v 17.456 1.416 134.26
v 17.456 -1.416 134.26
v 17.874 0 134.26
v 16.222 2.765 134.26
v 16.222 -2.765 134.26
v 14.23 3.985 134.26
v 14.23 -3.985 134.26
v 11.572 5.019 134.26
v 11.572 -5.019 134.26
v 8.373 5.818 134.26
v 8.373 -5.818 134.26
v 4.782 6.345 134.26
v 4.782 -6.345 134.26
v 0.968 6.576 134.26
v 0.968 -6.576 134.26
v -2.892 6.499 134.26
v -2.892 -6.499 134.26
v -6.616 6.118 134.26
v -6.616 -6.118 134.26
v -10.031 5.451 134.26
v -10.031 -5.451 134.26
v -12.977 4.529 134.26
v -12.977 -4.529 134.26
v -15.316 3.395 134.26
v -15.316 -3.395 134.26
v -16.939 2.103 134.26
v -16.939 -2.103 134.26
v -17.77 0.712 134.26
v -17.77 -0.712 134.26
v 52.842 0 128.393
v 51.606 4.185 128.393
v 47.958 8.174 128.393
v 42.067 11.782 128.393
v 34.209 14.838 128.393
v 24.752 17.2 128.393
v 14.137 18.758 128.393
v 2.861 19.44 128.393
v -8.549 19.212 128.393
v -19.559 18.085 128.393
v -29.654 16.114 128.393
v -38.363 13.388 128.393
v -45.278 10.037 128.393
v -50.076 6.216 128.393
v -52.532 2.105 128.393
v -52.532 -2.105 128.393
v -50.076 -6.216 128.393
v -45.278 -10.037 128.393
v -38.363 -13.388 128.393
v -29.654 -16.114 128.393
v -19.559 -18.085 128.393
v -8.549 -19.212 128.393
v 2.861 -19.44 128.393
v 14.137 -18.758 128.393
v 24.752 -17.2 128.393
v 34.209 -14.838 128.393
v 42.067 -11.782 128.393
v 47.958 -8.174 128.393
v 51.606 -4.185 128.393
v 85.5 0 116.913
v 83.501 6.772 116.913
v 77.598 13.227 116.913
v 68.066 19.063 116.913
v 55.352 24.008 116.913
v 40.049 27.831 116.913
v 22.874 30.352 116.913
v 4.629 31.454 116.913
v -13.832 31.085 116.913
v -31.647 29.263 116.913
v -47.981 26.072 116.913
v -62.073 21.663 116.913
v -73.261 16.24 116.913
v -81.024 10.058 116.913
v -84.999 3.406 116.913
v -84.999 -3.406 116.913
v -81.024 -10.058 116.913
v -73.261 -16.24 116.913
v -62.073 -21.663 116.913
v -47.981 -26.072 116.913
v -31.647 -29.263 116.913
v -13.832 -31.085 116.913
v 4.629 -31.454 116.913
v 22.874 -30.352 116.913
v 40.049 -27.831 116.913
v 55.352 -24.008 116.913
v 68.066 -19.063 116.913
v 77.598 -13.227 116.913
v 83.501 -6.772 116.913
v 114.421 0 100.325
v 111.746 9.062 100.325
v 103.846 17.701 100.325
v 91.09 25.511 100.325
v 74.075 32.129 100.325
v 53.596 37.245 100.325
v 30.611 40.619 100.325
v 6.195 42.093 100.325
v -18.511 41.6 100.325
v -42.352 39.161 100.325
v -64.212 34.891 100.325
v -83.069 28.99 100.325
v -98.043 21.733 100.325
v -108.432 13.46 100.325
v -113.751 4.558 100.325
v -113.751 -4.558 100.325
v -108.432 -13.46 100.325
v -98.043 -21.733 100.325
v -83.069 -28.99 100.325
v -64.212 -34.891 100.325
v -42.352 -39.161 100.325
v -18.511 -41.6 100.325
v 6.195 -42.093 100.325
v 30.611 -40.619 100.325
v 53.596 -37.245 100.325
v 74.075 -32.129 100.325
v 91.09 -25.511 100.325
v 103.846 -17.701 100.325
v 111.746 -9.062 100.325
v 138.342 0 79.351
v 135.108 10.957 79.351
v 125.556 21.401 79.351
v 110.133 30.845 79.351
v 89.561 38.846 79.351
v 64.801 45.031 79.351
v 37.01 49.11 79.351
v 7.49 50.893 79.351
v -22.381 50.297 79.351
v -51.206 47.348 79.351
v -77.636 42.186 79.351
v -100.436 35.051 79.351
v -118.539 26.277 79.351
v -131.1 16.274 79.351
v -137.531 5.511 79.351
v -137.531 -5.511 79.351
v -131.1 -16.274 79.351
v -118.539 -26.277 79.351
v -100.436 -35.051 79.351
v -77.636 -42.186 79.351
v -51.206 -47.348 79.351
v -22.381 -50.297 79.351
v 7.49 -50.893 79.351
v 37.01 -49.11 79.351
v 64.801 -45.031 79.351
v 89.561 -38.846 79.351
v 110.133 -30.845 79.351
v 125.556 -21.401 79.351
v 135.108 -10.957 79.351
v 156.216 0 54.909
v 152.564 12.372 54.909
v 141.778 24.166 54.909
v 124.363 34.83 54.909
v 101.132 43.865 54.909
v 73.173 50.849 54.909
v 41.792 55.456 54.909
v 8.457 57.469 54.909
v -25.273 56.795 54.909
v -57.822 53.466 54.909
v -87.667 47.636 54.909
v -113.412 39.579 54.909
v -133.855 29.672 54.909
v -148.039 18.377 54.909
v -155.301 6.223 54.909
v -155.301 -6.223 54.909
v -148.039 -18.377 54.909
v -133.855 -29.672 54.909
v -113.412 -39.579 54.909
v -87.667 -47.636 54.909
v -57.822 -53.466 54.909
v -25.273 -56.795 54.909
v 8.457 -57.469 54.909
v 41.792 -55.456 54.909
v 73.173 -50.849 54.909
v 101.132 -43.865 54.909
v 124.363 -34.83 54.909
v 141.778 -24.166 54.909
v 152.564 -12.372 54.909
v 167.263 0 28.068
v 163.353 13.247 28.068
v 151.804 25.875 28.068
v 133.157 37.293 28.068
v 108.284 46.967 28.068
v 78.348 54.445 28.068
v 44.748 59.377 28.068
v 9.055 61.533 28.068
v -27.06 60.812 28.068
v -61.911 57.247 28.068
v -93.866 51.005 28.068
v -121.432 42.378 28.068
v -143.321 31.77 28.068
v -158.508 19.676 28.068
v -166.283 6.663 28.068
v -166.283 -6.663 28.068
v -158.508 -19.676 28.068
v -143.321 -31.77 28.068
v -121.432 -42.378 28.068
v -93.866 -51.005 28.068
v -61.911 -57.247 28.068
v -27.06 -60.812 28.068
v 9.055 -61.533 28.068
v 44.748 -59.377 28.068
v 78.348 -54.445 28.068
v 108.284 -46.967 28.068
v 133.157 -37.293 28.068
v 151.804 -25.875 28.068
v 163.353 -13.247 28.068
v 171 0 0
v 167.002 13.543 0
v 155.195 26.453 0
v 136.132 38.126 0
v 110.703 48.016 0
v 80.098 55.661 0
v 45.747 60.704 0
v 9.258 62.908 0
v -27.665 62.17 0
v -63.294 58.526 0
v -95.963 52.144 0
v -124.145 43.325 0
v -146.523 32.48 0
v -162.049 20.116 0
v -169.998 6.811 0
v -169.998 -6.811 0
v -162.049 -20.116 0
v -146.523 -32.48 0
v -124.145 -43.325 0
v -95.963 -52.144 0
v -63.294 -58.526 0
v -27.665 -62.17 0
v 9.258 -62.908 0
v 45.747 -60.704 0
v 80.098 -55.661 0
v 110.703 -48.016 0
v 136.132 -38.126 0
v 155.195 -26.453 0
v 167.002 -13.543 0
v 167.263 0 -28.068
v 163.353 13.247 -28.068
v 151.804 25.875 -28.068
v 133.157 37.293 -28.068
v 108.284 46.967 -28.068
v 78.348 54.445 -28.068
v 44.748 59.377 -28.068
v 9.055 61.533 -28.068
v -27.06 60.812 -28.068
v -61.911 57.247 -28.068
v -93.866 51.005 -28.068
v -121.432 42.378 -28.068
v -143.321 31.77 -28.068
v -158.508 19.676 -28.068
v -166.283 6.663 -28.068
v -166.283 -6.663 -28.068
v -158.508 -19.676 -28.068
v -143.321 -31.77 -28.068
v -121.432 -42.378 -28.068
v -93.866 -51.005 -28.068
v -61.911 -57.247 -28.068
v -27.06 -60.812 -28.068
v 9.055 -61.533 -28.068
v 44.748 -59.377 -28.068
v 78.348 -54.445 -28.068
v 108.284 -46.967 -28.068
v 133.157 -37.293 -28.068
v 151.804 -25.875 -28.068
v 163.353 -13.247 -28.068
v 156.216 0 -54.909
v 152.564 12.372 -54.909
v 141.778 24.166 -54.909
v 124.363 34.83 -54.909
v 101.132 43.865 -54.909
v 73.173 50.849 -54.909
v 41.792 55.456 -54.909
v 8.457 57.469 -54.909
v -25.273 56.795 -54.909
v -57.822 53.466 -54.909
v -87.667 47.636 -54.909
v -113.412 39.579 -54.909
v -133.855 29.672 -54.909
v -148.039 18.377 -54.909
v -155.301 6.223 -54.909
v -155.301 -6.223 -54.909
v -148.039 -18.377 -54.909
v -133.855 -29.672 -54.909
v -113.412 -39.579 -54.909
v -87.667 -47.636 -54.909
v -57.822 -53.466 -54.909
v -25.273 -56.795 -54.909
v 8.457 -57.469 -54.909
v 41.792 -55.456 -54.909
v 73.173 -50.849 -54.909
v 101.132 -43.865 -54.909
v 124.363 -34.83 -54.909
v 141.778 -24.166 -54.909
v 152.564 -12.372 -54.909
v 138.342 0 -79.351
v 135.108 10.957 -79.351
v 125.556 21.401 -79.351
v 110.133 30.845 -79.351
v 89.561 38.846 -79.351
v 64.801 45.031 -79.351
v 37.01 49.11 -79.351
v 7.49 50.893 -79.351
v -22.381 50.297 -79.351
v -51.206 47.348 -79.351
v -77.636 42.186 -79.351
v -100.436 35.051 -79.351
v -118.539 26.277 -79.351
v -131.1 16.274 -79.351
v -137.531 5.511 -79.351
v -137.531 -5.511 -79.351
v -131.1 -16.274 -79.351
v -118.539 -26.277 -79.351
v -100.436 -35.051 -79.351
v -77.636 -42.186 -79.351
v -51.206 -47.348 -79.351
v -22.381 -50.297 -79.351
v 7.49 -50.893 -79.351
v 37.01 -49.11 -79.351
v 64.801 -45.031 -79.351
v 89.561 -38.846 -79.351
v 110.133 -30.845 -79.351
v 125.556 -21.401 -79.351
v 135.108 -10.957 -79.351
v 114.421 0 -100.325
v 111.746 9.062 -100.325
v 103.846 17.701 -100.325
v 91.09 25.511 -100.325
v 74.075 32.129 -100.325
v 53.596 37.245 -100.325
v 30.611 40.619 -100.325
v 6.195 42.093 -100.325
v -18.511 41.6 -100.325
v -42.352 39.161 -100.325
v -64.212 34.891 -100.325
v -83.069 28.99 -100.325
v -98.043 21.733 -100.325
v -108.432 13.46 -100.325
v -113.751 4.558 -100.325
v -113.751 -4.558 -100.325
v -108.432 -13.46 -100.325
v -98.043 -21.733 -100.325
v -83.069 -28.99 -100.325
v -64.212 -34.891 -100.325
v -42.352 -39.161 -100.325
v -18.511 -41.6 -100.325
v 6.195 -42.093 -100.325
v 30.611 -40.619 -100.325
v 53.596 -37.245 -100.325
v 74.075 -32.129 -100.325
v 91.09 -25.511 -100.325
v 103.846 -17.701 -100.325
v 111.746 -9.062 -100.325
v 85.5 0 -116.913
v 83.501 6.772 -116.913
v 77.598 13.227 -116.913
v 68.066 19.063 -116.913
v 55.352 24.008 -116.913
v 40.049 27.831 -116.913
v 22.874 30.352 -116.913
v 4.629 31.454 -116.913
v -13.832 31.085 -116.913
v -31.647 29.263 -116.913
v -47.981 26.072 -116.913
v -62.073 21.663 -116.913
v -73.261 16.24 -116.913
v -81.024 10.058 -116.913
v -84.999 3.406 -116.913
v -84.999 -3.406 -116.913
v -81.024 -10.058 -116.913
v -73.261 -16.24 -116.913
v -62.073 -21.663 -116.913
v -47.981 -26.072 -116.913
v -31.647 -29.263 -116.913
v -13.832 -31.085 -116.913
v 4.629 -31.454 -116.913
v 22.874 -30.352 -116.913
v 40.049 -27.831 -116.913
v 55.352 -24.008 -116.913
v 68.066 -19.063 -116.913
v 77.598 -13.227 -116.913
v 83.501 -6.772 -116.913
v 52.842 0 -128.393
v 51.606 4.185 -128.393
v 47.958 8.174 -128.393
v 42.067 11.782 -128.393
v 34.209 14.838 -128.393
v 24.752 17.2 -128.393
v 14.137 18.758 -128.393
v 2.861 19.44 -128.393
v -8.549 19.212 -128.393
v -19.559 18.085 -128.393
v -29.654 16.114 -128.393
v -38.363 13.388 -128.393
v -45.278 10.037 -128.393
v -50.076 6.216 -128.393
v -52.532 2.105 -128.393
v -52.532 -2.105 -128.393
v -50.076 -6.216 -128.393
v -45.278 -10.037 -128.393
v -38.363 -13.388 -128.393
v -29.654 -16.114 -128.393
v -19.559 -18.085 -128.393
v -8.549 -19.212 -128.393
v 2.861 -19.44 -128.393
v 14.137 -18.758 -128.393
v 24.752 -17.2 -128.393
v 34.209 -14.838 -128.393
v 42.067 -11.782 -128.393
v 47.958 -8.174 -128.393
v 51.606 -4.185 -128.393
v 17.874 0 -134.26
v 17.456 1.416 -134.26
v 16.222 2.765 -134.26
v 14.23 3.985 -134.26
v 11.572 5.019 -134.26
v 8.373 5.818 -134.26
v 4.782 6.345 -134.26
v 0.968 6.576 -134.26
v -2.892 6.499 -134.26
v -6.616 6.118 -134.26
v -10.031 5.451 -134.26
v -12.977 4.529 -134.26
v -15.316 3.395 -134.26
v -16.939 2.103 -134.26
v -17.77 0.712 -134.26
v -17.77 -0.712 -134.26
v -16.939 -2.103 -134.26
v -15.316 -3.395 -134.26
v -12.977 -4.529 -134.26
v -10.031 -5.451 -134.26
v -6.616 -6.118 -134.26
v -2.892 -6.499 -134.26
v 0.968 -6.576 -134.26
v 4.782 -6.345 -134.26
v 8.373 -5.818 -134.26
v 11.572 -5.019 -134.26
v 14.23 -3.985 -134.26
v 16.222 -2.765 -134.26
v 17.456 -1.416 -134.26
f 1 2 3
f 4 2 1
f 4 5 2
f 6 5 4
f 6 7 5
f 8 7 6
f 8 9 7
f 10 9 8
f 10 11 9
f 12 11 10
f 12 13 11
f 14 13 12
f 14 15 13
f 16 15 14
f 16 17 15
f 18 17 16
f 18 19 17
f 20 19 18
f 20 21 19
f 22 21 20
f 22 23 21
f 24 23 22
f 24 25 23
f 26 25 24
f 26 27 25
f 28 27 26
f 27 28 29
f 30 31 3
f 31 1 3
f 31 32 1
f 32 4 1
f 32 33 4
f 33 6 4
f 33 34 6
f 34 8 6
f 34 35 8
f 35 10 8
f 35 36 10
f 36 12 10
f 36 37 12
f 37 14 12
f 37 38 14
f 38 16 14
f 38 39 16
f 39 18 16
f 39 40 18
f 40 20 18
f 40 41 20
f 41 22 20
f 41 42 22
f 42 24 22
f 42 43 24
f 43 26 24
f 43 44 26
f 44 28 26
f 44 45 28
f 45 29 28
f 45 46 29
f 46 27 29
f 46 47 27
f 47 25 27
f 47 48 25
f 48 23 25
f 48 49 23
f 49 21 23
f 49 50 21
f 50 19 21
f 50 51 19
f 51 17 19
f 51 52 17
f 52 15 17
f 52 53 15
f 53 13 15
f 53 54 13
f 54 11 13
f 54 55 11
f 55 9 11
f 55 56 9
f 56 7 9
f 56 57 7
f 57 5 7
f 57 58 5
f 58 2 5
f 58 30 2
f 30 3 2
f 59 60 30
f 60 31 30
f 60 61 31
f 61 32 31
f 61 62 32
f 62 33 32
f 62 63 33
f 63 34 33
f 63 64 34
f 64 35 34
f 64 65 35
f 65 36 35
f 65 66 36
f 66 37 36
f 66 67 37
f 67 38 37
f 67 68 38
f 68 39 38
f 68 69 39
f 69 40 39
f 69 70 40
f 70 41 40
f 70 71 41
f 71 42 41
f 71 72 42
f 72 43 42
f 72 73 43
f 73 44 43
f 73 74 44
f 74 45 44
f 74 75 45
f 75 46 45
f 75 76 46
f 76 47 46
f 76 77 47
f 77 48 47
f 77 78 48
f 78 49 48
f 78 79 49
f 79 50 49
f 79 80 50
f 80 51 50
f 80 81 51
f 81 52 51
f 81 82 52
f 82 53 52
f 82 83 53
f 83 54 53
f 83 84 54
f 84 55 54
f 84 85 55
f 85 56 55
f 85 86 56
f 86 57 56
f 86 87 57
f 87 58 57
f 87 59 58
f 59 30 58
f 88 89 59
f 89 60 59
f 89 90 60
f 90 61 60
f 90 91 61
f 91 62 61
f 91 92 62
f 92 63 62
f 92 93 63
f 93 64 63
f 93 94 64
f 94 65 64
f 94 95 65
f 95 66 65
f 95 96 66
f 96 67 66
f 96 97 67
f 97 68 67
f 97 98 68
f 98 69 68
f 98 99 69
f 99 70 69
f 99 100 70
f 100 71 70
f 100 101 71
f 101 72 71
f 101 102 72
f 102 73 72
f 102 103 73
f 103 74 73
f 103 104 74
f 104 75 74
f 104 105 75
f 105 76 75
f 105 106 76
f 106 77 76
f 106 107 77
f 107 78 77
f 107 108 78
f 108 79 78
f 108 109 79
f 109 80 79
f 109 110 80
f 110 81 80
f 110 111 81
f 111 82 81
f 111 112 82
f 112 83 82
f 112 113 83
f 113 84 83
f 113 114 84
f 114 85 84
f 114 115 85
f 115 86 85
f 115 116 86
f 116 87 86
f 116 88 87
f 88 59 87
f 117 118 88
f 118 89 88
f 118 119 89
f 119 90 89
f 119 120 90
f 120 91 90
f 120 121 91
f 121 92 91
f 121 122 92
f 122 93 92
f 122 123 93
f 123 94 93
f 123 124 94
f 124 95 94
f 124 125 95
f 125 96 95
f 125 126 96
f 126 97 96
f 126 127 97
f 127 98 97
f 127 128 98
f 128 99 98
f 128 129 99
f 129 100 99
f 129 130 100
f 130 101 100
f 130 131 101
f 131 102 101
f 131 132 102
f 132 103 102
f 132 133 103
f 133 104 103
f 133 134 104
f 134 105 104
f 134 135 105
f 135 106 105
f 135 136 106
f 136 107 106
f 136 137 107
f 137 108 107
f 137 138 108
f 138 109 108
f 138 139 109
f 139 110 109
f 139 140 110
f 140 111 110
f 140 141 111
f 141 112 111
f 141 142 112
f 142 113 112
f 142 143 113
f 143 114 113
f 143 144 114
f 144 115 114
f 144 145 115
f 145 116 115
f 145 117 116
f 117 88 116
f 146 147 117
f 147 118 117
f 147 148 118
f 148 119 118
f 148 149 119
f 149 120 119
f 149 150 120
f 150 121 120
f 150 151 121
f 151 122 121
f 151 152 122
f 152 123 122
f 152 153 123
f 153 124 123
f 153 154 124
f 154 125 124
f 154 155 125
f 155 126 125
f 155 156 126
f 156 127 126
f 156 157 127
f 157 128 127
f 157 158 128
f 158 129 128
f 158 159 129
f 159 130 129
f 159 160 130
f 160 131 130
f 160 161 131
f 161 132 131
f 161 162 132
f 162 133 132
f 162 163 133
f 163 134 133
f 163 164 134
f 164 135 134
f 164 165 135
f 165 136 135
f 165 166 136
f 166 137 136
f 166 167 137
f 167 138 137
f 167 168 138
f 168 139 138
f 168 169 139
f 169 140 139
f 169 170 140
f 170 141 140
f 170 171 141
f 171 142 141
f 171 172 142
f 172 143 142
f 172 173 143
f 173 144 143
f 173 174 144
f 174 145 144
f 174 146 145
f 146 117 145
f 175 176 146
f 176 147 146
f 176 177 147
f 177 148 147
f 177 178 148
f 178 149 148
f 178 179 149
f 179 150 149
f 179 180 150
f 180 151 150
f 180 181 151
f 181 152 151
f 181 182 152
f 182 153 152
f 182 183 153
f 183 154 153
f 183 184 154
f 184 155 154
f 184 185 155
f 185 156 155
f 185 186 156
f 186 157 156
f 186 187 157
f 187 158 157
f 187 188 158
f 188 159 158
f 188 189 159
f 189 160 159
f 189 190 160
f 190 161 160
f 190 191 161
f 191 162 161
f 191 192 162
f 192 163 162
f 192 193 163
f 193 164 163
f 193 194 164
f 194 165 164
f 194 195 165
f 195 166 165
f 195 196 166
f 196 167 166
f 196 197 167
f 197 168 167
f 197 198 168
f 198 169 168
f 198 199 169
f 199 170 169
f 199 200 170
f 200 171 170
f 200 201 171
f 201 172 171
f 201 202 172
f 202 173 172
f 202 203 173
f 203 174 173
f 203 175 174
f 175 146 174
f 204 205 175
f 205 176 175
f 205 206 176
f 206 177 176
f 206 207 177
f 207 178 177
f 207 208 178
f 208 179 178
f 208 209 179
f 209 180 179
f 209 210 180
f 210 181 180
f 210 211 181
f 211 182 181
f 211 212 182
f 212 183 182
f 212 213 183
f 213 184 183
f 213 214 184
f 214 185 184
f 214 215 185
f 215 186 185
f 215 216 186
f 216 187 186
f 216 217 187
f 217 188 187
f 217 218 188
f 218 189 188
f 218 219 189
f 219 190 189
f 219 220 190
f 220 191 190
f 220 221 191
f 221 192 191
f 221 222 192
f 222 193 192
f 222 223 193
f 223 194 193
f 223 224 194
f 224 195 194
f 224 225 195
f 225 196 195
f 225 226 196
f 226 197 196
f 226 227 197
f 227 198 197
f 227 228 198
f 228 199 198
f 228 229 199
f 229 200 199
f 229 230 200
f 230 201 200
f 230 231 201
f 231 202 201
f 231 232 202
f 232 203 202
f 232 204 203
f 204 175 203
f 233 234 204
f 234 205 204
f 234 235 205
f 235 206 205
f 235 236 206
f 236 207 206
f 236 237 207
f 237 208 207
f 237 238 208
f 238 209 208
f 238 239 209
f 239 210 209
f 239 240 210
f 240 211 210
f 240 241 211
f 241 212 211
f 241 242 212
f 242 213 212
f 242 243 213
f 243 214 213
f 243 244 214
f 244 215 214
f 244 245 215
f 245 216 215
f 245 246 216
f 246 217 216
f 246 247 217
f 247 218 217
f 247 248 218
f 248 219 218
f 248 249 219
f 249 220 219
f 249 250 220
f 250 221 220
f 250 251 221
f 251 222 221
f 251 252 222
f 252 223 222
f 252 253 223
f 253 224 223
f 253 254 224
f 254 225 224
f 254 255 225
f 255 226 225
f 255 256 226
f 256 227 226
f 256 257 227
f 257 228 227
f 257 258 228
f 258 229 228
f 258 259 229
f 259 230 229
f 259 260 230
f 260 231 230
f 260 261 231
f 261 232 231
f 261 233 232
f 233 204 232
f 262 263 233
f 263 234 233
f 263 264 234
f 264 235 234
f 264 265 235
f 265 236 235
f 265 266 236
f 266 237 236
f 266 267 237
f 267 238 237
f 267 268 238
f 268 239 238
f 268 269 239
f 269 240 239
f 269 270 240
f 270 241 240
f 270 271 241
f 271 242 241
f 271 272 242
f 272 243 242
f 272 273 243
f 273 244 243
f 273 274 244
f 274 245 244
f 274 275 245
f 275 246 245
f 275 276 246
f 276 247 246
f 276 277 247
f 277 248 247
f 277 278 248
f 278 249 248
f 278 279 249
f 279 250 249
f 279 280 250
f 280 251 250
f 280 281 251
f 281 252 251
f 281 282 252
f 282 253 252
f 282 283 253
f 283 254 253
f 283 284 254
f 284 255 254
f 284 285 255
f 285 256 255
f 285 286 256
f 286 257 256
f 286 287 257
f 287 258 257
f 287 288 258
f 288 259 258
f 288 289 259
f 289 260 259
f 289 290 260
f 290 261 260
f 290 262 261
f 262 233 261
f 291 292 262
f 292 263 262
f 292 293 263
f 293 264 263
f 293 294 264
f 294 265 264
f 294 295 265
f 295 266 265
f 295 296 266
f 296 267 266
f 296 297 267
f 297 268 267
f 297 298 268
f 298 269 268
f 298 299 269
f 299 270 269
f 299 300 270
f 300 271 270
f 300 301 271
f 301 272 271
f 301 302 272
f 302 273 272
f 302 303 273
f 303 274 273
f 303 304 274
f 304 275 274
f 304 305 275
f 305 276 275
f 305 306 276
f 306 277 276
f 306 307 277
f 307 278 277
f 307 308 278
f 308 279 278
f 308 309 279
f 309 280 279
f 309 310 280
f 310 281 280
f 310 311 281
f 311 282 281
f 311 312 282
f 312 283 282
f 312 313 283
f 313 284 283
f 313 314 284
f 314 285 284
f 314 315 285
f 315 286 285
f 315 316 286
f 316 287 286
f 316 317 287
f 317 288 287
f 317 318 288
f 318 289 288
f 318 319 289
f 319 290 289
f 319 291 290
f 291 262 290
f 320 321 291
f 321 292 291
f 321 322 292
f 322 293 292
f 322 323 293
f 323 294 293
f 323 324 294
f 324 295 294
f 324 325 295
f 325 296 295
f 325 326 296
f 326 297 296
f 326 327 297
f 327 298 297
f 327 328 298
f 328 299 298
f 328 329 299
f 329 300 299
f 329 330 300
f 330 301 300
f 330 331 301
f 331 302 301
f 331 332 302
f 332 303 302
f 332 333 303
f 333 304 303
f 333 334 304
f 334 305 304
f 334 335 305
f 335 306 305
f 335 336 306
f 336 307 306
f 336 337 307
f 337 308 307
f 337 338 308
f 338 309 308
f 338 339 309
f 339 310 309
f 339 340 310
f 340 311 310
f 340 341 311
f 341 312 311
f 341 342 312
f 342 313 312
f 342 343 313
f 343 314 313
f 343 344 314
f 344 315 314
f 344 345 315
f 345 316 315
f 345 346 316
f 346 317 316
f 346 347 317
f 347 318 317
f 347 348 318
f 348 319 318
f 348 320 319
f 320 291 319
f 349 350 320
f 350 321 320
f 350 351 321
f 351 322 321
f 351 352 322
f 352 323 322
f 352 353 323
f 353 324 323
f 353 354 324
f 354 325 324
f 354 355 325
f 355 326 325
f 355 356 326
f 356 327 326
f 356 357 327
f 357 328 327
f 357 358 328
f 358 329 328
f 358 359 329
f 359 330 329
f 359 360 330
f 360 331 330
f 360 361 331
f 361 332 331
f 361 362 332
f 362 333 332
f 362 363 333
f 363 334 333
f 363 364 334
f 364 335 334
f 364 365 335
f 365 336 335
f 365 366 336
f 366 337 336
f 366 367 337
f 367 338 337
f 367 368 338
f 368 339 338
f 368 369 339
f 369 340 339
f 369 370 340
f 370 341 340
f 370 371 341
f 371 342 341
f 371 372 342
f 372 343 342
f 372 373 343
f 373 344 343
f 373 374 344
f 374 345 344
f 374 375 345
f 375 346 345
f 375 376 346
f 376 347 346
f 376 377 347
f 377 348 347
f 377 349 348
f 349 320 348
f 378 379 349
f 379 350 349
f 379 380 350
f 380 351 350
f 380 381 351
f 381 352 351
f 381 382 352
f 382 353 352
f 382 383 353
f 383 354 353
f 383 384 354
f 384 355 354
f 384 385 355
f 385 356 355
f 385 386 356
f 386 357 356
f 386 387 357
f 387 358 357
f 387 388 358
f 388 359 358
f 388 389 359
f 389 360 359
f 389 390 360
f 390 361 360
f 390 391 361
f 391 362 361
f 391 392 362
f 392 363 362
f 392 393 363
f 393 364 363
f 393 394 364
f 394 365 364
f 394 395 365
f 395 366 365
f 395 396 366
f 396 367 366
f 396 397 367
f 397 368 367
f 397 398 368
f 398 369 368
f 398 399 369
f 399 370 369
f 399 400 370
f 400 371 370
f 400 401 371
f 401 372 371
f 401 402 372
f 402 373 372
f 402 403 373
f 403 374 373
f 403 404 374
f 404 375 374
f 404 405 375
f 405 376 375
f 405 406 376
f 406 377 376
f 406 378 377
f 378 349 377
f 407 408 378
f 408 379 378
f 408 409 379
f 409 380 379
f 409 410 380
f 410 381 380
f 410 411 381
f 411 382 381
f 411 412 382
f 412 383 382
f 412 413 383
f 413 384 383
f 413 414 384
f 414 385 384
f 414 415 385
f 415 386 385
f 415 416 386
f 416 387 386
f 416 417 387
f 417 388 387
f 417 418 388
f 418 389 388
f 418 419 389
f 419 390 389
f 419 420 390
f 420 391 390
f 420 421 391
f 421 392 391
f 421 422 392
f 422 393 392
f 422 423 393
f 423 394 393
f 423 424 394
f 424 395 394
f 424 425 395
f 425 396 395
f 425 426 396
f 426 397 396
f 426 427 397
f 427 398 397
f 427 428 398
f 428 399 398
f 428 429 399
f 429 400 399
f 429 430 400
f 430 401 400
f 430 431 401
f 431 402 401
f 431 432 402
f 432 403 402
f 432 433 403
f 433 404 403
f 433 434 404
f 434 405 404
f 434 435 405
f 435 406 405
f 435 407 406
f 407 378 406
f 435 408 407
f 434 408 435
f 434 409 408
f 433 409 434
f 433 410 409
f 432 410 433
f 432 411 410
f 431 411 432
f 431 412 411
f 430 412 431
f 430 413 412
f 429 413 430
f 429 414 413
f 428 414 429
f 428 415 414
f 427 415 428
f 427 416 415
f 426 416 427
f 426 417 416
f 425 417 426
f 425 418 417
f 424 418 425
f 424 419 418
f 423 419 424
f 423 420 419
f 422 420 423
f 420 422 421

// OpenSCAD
// Generated by SolidPython 1.0.1 on 2020-07-29 00:46:53


scale(v = [19, 7, 15]) {
	sphere(r = 9);
}
/***********************************************
*********      SolidPython code:      **********
************************************************
 
# import packages: SolidPython
from solid import *
from solid.utils import *
from itertools import chain, combinations, permutations


class Resize:

    def __init__(self, scad_file):
        self.scad_file = scad_file
        #self.scad_file = import_scad(scad_file)
        # cone/cylinder param:
        self.r1 = 0
        self.r2 = 0
        self.h = 0
        # rectangular prism param:
        self.w = 0
        self.l = 0
        # ellipse param:
        self.r = 0

    # import OpenScad code (file name corresponds to shape)


    # classify shape + parameters
    def assign(self, param1, param2, param3):
        if self.scad_file == 'cone.scad':
            self.r1 = param1
            self.r2 = param2
            self.h = param3
        elif self.scad_file == 'cylinder.scad':
            self.r1 = param1
            self.r2 = param2
            self.h = param3
        elif self.scad_file == 'rectangularPrism.scad':
            self.h = param1
            self.l = param2
            self.w = param3
        else:
            self.r = param1
            self.h = param2

    # resize parameters
    def iterate(self):
        x = range(3, 20, 2)
        i = 1
        if self.scad_file == 'cone.scad':
            tempList = list(permutations(x, 2))
            for temp in tempList:
                param1 = temp[0]
                param2 = temp[1]
                filepath = 'produced_scad_files/' + 'cone' + str(param1) + '_' + str(param2) + '_' + '.scad'
                scad_render_to_file(cylinder(h=param1, r1=param2, r2=0), filepath)

        elif self.scad_file == 'cylinder.scad':
            tempList = list(permutations(x, 3))
            for temp in tempList:
                param1 = temp[0]
                param2 = temp[1]
                filepath = 'produced_scad_files/' + 'cylinder' + str(param1) + '_' + str(param2) + '_' + '.scad'
                scad_render_to_file(cylinder(h=param1, r1=param2, r2=param2), filepath)

        elif self.scad_file == 'rectangularPrism.scad':
            tempList = list(permutations(x, 3))
            for temp in tempList:
                param1 = temp[0]
                param2 = temp[1]
                param3 = temp[2]
                filepath = 'produced_scad_files/' + 'rectangularPrism' + str(param1) + '_' + str(param2) + '_' + str(
                    param3) + '.scad'
                scad_render_to_file(cube(size=(param1, param2, param3)), filepath)

        elif self.scad_file == 'ellipse.scad':
            tempList = list(permutations(x, 4))
            for temp in tempList:
                param1 = temp[0]
                param2 = temp[1]
                param3 = temp[2]
                param4 = temp[3]
                filepath = 'produced_scad_files/' + 'ellipse' + str(param1) + '_' + str(param2) + '_' + str(param3) + '_' + str(param4) + '.scad'
                scad_render_to_file(scale([param1, param2, param3])(sphere(r=param4)), filepath)

    def render_to_scadfile(self):
        scad_render_to_file(scad, 'example.scad') 
 
************************************************/
